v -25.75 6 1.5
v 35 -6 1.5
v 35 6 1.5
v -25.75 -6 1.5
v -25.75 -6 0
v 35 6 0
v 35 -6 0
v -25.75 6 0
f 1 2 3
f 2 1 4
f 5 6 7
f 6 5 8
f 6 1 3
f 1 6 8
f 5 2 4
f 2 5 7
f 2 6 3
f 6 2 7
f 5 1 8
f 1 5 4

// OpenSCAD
// 10-well comb for casting agarose gels
// Print orientation: flat on bed, teeth pointing down (-Z)

// ---------- Parameters ----------
plate_t      = 1.5;   // plate thickness (Z)
spine_len    = 70;    // spine length (X)
spine_w      = 12;    // spine width (Y)
tooth_n      = 10;    // number of teeth
tooth_w      = 5.0;   // tooth width (X)
tooth_len    = 12;    // tooth length (Y)
tooth_pitch  = 1.5;   // gap between neighbouring teeth (X)
eps          = 0.5;   // overcut for clean differences

$fn = 64;

// ---------- Derived ----------
tooth_span = (tooth_n - 1) * tooth_pitch;   // 16.5 mm
x0         = -(spine_len / 2 + tooth_span / 2); // first tooth left edge

// ---------- Model ----------
difference() {
    union() {
        // Spine
        translate([-spine_len / 2, -spine_w / 2, 0])
            cube([spine_len, spine_w, plate_t]);

        // Teeth
        for (i = [0 : tooth_n - 1])
            translate([x0 + i * tooth_pitch - tooth_w / 2,
                       -tooth_len / 2, 0])
                cube([tooth_w, tooth_len, plate_t]);
    }

    // Tooth cutouts (extend past -Y face)
    for (i = [0 : tooth_n - 1])
        translate([x0 + i * tooth_pitch - tooth_w / 2,
                   -tooth_len / 2 - eps, 0])
            cube([tooth_w, tooth_len + 2 * eps, plate_t]);
}
